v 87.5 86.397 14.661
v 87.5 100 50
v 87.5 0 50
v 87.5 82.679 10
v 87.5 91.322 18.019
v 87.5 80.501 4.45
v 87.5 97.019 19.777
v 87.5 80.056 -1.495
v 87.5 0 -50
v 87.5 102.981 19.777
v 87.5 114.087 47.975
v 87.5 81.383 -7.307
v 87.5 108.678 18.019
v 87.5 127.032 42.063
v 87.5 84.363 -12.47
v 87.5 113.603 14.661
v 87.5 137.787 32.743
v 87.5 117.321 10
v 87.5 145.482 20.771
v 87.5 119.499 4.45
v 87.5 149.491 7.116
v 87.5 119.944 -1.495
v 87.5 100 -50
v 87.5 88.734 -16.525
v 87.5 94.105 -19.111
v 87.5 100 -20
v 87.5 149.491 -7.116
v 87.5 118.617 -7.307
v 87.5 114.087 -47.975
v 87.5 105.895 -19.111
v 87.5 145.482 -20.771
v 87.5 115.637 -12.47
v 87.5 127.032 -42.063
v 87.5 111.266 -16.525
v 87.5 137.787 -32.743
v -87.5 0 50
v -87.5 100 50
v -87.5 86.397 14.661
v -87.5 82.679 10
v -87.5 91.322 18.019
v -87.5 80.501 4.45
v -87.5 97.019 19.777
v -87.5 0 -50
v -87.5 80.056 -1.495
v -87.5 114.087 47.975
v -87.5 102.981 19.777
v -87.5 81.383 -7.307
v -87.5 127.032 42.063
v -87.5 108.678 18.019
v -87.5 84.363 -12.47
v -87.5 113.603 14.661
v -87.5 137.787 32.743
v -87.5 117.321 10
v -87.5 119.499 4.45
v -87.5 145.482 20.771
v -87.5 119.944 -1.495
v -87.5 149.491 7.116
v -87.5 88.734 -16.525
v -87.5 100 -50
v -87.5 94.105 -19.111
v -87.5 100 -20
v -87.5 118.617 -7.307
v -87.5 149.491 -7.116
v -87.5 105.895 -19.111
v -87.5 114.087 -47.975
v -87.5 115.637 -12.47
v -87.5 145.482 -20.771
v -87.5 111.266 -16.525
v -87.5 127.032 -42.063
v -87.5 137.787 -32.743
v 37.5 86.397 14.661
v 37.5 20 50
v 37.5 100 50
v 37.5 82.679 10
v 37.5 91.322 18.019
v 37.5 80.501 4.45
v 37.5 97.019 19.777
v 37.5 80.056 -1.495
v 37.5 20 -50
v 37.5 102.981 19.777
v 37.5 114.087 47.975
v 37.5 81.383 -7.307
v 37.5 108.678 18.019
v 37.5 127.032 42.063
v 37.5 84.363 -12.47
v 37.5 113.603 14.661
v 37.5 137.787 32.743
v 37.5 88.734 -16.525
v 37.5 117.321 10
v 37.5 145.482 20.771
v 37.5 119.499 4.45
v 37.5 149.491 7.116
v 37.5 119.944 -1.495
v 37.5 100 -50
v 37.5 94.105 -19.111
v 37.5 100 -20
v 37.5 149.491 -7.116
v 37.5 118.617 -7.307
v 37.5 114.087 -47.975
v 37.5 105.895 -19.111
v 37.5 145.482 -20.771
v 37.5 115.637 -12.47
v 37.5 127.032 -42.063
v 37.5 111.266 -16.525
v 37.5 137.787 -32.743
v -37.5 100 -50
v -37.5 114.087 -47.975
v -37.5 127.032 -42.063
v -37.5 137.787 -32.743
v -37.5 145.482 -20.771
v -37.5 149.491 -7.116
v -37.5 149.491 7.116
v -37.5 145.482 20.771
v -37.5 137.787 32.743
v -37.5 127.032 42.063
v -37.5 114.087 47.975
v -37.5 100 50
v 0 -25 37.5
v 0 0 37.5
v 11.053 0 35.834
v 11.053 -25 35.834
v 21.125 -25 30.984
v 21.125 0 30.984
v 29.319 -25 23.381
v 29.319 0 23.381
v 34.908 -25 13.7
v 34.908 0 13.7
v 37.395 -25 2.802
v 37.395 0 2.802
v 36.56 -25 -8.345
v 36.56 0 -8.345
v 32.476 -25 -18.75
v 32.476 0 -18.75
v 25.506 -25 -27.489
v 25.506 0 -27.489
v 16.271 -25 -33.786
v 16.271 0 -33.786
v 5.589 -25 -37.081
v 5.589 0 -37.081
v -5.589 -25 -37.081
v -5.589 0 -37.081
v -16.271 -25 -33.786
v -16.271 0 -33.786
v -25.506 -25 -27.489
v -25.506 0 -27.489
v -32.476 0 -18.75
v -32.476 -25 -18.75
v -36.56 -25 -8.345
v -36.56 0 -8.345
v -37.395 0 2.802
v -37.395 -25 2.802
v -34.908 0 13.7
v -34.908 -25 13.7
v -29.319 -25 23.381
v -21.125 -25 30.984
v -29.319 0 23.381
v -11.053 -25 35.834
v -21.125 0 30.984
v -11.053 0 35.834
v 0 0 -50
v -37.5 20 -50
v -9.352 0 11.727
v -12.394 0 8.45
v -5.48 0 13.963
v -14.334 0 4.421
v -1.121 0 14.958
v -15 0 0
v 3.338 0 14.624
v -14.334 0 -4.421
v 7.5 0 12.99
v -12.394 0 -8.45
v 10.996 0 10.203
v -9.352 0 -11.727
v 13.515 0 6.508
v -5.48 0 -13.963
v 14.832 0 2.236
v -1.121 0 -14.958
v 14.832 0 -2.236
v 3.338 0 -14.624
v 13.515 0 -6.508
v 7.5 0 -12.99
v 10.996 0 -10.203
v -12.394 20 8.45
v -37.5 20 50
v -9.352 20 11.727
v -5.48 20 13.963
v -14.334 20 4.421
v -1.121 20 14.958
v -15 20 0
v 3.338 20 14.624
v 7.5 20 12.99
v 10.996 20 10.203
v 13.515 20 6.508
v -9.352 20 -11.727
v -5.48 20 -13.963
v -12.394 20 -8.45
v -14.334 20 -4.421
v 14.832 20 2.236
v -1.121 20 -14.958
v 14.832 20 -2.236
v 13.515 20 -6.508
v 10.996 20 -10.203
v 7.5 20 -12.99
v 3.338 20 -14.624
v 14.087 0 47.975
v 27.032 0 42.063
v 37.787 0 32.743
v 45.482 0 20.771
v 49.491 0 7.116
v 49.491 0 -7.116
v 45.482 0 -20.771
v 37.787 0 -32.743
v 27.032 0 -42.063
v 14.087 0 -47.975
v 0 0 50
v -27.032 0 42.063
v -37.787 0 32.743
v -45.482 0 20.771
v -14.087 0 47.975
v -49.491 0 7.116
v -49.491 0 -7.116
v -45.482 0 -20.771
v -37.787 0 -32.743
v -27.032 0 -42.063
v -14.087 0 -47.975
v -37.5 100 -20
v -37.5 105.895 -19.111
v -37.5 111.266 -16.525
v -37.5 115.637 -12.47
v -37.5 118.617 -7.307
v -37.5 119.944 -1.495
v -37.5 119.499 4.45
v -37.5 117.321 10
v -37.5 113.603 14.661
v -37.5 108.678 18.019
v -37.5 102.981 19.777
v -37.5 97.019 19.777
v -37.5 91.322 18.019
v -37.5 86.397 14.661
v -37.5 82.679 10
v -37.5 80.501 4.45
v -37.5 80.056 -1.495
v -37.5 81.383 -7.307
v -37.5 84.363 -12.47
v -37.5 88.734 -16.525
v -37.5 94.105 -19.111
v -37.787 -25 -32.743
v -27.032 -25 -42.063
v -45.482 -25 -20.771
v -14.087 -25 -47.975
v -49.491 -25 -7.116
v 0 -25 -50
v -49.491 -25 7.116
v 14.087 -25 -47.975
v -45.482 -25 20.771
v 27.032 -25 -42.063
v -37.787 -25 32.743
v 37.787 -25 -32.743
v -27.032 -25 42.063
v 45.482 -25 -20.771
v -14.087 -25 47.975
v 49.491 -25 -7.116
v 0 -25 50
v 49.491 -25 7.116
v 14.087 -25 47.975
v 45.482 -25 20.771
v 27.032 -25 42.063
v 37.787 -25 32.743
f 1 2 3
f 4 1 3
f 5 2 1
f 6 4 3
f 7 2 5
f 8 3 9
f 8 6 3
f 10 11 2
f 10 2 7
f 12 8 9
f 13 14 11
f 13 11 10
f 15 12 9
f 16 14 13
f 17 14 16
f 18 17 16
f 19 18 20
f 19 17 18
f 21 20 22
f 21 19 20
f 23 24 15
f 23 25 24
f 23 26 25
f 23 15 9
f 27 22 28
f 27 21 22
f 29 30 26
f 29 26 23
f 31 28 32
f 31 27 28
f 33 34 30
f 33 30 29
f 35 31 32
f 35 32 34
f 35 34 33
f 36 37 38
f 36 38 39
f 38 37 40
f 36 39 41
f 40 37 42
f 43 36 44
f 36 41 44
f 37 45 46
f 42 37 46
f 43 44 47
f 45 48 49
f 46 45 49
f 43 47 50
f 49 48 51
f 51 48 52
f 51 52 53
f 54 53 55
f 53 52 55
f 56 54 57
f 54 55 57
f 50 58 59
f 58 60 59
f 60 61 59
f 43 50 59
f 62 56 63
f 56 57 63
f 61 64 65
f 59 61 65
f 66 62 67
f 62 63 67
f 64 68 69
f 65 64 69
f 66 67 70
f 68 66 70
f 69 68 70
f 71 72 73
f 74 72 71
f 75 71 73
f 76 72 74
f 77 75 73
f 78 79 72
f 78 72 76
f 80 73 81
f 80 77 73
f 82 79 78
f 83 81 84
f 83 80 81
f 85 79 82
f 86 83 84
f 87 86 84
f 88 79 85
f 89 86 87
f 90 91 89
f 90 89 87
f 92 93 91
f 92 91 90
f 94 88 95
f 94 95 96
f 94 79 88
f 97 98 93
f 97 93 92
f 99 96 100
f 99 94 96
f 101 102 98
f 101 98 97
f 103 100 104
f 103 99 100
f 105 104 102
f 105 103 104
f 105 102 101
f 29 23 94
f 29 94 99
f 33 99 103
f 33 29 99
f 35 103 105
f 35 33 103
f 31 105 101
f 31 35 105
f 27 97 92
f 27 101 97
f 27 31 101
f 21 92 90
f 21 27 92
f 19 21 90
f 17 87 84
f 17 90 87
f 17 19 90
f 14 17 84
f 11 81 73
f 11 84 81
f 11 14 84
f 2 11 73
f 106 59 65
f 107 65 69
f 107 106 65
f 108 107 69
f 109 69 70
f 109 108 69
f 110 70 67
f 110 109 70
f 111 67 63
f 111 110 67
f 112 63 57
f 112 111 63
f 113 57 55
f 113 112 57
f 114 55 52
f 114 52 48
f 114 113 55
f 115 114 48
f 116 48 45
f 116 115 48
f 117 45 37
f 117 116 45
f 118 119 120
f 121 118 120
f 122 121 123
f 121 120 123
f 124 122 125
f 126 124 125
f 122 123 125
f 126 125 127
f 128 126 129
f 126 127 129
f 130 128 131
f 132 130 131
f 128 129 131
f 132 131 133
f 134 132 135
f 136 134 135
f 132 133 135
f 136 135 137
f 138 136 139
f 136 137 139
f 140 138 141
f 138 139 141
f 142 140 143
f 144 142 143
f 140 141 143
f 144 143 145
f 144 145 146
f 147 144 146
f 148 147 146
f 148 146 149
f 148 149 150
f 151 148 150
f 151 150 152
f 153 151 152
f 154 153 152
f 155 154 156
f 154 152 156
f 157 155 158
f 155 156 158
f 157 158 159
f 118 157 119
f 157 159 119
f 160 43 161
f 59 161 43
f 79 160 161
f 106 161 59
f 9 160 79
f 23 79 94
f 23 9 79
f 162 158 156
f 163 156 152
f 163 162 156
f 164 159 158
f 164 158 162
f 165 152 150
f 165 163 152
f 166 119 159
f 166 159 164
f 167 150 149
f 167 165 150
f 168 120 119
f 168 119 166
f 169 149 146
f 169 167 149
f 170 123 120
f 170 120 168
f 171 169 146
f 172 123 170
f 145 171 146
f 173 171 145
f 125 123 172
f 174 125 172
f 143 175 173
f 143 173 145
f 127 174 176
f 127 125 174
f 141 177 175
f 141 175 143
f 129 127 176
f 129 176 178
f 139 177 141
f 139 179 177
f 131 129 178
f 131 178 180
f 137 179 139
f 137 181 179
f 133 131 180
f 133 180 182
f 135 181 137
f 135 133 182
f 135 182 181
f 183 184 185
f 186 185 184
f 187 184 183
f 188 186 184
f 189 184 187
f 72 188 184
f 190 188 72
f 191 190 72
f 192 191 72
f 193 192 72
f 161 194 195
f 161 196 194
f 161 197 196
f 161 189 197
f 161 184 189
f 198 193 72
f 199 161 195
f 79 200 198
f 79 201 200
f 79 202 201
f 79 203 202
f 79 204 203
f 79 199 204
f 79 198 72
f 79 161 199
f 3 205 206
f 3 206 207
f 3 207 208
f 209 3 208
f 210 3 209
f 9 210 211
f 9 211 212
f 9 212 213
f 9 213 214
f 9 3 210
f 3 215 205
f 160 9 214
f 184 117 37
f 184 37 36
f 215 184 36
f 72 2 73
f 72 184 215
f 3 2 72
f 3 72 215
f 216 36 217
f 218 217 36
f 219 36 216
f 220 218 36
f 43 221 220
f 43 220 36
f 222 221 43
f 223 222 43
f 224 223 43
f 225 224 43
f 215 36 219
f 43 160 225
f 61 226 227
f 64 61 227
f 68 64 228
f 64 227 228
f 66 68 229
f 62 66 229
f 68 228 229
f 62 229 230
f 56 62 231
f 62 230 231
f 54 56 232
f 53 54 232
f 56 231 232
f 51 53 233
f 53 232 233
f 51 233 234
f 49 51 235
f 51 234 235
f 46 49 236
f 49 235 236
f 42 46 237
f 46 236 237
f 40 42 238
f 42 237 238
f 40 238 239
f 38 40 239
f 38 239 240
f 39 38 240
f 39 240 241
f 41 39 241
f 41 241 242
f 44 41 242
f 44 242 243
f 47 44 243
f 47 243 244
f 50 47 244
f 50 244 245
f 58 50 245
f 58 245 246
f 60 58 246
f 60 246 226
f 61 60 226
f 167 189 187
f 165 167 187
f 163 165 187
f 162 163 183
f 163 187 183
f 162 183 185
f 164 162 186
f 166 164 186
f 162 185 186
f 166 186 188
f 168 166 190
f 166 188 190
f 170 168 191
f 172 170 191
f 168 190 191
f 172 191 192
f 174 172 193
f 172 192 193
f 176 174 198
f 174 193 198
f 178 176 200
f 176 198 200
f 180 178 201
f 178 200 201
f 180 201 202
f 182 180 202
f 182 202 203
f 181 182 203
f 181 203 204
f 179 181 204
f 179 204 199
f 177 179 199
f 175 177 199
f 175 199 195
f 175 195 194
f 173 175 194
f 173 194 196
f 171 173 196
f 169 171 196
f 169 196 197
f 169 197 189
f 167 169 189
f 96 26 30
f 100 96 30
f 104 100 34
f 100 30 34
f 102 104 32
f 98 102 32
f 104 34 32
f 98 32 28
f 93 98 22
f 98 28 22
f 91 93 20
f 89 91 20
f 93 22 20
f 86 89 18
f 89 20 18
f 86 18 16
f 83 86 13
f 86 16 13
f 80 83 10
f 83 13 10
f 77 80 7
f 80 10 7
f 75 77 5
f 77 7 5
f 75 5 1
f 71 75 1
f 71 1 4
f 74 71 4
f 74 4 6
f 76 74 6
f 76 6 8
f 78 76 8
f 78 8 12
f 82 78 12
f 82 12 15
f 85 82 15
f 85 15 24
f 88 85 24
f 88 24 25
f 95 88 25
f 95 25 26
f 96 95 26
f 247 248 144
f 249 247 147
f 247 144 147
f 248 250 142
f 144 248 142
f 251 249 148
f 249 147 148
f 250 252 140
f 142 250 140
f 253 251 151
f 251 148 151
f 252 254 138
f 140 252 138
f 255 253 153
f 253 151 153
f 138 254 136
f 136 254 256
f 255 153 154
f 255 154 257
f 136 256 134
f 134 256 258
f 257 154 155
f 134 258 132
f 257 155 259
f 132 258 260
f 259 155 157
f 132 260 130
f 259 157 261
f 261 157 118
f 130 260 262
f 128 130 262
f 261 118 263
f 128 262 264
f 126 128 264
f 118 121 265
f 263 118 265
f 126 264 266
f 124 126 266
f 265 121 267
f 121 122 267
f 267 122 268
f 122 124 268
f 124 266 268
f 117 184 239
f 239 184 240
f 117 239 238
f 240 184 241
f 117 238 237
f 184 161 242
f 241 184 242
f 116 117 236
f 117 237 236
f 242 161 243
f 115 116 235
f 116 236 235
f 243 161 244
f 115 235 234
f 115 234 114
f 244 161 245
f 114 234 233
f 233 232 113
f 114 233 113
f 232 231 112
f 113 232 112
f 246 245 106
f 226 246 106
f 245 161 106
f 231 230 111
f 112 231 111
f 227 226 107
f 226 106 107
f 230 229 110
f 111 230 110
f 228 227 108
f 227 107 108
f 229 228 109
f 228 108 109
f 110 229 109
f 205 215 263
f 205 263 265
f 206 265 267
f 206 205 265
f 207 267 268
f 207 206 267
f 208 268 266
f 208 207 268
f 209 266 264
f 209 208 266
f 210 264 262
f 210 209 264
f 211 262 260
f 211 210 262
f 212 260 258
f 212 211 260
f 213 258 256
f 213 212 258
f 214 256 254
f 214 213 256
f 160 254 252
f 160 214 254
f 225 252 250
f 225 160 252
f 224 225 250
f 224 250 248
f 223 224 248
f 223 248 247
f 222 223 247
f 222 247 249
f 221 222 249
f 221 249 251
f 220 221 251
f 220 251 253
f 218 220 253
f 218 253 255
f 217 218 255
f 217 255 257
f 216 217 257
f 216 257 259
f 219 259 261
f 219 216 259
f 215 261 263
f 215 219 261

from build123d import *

# Parameters (mm, degrees)
SKETCH1_R               = 50
SKETCH1_R_2             = 37.5
BOSS_EXTRUDE1_DEPTH     = 25
BOSS_EXTRUDE2_DEPTH     = 87.5
CUT_EXTRUDE1_DEPTH      = 201.390244274
CUT_EXTRUDE1_DEPTH_BACK = 201.390244274
SKETCH3_W               = 75
SKETCH3_H               = 130
SKETCH4_R               = 15
CUT_EXTRUDE2_DEPTH      = 165.487841496
SKETCH5_R               = 20
CUT_EXTRUDE3_DEPTH      = 236.849528301


with BuildPart() as part:
    # Sketch1 → Boss-Extrude1 (new body)
    with BuildSketch(Plane(origin=(0, 0, 0), x_dir=(1, 0, 0), z_dir=(0, 1, 0))):
        with Locations(Location((0, 0, 0), (0, 0, 270))):
            Circle(SKETCH1_R)
        with Locations(Location((0, 0, 0), (0, 0, 270))):
            Circle(SKETCH1_R_2, mode=Mode.SUBTRACT)
    extrude(amount=-BOSS_EXTRUDE1_DEPTH)

    # Sketch2 → Boss-Extrude2 (add, symmetric)
    with BuildSketch(Plane(origin=(0, 0, 0), x_dir=(0, 0, -1), z_dir=(1, 0, 0))):
        with BuildLine():
            Line((-50, 0), (50, 0))
            Line((50, 0), (50, 100))
            ThreePointArc((50, 100), (0, 150), (-50, 100))
            Line((-50, 100), (-50, 0))
        make_face()
    extrude(amount=BOSS_EXTRUDE2_DEPTH, both=True)

    # Sketch3 → Cut-Extrude1 (cut, two sides: drawn at the far end of the back side and taken through both)
    with BuildSketch(Plane.XY.offset(50).offset(-CUT_EXTRUDE1_DEPTH_BACK)):
        with Locations((0, 85)):
            Rectangle(SKETCH3_W, SKETCH3_H)
    extrude(amount=CUT_EXTRUDE1_DEPTH + CUT_EXTRUDE1_DEPTH_BACK, mode=Mode.SUBTRACT)

    # Sketch4 → Cut-Extrude2 (cut, through all)
    with BuildSketch(Plane(origin=(0, 20, 0), x_dir=(1, 0, 0), z_dir=(0, 1, 0))):
        with Locations(Location((0, 0, 0), (0, 0, 180))):
            Circle(SKETCH4_R)
    extrude(amount=-CUT_EXTRUDE2_DEPTH, mode=Mode.SUBTRACT)

    # Sketch5 → Cut-Extrude3 (cut, through all)
    with BuildSketch(Plane(origin=(87.5, 0, 0), x_dir=(0, 0, -1), z_dir=(1, 0, 0))):
        with Locations((0, 100)):
            Circle(SKETCH5_R)
    extrude(amount=-CUT_EXTRUDE3_DEPTH, mode=Mode.SUBTRACT)


solid = part.part
